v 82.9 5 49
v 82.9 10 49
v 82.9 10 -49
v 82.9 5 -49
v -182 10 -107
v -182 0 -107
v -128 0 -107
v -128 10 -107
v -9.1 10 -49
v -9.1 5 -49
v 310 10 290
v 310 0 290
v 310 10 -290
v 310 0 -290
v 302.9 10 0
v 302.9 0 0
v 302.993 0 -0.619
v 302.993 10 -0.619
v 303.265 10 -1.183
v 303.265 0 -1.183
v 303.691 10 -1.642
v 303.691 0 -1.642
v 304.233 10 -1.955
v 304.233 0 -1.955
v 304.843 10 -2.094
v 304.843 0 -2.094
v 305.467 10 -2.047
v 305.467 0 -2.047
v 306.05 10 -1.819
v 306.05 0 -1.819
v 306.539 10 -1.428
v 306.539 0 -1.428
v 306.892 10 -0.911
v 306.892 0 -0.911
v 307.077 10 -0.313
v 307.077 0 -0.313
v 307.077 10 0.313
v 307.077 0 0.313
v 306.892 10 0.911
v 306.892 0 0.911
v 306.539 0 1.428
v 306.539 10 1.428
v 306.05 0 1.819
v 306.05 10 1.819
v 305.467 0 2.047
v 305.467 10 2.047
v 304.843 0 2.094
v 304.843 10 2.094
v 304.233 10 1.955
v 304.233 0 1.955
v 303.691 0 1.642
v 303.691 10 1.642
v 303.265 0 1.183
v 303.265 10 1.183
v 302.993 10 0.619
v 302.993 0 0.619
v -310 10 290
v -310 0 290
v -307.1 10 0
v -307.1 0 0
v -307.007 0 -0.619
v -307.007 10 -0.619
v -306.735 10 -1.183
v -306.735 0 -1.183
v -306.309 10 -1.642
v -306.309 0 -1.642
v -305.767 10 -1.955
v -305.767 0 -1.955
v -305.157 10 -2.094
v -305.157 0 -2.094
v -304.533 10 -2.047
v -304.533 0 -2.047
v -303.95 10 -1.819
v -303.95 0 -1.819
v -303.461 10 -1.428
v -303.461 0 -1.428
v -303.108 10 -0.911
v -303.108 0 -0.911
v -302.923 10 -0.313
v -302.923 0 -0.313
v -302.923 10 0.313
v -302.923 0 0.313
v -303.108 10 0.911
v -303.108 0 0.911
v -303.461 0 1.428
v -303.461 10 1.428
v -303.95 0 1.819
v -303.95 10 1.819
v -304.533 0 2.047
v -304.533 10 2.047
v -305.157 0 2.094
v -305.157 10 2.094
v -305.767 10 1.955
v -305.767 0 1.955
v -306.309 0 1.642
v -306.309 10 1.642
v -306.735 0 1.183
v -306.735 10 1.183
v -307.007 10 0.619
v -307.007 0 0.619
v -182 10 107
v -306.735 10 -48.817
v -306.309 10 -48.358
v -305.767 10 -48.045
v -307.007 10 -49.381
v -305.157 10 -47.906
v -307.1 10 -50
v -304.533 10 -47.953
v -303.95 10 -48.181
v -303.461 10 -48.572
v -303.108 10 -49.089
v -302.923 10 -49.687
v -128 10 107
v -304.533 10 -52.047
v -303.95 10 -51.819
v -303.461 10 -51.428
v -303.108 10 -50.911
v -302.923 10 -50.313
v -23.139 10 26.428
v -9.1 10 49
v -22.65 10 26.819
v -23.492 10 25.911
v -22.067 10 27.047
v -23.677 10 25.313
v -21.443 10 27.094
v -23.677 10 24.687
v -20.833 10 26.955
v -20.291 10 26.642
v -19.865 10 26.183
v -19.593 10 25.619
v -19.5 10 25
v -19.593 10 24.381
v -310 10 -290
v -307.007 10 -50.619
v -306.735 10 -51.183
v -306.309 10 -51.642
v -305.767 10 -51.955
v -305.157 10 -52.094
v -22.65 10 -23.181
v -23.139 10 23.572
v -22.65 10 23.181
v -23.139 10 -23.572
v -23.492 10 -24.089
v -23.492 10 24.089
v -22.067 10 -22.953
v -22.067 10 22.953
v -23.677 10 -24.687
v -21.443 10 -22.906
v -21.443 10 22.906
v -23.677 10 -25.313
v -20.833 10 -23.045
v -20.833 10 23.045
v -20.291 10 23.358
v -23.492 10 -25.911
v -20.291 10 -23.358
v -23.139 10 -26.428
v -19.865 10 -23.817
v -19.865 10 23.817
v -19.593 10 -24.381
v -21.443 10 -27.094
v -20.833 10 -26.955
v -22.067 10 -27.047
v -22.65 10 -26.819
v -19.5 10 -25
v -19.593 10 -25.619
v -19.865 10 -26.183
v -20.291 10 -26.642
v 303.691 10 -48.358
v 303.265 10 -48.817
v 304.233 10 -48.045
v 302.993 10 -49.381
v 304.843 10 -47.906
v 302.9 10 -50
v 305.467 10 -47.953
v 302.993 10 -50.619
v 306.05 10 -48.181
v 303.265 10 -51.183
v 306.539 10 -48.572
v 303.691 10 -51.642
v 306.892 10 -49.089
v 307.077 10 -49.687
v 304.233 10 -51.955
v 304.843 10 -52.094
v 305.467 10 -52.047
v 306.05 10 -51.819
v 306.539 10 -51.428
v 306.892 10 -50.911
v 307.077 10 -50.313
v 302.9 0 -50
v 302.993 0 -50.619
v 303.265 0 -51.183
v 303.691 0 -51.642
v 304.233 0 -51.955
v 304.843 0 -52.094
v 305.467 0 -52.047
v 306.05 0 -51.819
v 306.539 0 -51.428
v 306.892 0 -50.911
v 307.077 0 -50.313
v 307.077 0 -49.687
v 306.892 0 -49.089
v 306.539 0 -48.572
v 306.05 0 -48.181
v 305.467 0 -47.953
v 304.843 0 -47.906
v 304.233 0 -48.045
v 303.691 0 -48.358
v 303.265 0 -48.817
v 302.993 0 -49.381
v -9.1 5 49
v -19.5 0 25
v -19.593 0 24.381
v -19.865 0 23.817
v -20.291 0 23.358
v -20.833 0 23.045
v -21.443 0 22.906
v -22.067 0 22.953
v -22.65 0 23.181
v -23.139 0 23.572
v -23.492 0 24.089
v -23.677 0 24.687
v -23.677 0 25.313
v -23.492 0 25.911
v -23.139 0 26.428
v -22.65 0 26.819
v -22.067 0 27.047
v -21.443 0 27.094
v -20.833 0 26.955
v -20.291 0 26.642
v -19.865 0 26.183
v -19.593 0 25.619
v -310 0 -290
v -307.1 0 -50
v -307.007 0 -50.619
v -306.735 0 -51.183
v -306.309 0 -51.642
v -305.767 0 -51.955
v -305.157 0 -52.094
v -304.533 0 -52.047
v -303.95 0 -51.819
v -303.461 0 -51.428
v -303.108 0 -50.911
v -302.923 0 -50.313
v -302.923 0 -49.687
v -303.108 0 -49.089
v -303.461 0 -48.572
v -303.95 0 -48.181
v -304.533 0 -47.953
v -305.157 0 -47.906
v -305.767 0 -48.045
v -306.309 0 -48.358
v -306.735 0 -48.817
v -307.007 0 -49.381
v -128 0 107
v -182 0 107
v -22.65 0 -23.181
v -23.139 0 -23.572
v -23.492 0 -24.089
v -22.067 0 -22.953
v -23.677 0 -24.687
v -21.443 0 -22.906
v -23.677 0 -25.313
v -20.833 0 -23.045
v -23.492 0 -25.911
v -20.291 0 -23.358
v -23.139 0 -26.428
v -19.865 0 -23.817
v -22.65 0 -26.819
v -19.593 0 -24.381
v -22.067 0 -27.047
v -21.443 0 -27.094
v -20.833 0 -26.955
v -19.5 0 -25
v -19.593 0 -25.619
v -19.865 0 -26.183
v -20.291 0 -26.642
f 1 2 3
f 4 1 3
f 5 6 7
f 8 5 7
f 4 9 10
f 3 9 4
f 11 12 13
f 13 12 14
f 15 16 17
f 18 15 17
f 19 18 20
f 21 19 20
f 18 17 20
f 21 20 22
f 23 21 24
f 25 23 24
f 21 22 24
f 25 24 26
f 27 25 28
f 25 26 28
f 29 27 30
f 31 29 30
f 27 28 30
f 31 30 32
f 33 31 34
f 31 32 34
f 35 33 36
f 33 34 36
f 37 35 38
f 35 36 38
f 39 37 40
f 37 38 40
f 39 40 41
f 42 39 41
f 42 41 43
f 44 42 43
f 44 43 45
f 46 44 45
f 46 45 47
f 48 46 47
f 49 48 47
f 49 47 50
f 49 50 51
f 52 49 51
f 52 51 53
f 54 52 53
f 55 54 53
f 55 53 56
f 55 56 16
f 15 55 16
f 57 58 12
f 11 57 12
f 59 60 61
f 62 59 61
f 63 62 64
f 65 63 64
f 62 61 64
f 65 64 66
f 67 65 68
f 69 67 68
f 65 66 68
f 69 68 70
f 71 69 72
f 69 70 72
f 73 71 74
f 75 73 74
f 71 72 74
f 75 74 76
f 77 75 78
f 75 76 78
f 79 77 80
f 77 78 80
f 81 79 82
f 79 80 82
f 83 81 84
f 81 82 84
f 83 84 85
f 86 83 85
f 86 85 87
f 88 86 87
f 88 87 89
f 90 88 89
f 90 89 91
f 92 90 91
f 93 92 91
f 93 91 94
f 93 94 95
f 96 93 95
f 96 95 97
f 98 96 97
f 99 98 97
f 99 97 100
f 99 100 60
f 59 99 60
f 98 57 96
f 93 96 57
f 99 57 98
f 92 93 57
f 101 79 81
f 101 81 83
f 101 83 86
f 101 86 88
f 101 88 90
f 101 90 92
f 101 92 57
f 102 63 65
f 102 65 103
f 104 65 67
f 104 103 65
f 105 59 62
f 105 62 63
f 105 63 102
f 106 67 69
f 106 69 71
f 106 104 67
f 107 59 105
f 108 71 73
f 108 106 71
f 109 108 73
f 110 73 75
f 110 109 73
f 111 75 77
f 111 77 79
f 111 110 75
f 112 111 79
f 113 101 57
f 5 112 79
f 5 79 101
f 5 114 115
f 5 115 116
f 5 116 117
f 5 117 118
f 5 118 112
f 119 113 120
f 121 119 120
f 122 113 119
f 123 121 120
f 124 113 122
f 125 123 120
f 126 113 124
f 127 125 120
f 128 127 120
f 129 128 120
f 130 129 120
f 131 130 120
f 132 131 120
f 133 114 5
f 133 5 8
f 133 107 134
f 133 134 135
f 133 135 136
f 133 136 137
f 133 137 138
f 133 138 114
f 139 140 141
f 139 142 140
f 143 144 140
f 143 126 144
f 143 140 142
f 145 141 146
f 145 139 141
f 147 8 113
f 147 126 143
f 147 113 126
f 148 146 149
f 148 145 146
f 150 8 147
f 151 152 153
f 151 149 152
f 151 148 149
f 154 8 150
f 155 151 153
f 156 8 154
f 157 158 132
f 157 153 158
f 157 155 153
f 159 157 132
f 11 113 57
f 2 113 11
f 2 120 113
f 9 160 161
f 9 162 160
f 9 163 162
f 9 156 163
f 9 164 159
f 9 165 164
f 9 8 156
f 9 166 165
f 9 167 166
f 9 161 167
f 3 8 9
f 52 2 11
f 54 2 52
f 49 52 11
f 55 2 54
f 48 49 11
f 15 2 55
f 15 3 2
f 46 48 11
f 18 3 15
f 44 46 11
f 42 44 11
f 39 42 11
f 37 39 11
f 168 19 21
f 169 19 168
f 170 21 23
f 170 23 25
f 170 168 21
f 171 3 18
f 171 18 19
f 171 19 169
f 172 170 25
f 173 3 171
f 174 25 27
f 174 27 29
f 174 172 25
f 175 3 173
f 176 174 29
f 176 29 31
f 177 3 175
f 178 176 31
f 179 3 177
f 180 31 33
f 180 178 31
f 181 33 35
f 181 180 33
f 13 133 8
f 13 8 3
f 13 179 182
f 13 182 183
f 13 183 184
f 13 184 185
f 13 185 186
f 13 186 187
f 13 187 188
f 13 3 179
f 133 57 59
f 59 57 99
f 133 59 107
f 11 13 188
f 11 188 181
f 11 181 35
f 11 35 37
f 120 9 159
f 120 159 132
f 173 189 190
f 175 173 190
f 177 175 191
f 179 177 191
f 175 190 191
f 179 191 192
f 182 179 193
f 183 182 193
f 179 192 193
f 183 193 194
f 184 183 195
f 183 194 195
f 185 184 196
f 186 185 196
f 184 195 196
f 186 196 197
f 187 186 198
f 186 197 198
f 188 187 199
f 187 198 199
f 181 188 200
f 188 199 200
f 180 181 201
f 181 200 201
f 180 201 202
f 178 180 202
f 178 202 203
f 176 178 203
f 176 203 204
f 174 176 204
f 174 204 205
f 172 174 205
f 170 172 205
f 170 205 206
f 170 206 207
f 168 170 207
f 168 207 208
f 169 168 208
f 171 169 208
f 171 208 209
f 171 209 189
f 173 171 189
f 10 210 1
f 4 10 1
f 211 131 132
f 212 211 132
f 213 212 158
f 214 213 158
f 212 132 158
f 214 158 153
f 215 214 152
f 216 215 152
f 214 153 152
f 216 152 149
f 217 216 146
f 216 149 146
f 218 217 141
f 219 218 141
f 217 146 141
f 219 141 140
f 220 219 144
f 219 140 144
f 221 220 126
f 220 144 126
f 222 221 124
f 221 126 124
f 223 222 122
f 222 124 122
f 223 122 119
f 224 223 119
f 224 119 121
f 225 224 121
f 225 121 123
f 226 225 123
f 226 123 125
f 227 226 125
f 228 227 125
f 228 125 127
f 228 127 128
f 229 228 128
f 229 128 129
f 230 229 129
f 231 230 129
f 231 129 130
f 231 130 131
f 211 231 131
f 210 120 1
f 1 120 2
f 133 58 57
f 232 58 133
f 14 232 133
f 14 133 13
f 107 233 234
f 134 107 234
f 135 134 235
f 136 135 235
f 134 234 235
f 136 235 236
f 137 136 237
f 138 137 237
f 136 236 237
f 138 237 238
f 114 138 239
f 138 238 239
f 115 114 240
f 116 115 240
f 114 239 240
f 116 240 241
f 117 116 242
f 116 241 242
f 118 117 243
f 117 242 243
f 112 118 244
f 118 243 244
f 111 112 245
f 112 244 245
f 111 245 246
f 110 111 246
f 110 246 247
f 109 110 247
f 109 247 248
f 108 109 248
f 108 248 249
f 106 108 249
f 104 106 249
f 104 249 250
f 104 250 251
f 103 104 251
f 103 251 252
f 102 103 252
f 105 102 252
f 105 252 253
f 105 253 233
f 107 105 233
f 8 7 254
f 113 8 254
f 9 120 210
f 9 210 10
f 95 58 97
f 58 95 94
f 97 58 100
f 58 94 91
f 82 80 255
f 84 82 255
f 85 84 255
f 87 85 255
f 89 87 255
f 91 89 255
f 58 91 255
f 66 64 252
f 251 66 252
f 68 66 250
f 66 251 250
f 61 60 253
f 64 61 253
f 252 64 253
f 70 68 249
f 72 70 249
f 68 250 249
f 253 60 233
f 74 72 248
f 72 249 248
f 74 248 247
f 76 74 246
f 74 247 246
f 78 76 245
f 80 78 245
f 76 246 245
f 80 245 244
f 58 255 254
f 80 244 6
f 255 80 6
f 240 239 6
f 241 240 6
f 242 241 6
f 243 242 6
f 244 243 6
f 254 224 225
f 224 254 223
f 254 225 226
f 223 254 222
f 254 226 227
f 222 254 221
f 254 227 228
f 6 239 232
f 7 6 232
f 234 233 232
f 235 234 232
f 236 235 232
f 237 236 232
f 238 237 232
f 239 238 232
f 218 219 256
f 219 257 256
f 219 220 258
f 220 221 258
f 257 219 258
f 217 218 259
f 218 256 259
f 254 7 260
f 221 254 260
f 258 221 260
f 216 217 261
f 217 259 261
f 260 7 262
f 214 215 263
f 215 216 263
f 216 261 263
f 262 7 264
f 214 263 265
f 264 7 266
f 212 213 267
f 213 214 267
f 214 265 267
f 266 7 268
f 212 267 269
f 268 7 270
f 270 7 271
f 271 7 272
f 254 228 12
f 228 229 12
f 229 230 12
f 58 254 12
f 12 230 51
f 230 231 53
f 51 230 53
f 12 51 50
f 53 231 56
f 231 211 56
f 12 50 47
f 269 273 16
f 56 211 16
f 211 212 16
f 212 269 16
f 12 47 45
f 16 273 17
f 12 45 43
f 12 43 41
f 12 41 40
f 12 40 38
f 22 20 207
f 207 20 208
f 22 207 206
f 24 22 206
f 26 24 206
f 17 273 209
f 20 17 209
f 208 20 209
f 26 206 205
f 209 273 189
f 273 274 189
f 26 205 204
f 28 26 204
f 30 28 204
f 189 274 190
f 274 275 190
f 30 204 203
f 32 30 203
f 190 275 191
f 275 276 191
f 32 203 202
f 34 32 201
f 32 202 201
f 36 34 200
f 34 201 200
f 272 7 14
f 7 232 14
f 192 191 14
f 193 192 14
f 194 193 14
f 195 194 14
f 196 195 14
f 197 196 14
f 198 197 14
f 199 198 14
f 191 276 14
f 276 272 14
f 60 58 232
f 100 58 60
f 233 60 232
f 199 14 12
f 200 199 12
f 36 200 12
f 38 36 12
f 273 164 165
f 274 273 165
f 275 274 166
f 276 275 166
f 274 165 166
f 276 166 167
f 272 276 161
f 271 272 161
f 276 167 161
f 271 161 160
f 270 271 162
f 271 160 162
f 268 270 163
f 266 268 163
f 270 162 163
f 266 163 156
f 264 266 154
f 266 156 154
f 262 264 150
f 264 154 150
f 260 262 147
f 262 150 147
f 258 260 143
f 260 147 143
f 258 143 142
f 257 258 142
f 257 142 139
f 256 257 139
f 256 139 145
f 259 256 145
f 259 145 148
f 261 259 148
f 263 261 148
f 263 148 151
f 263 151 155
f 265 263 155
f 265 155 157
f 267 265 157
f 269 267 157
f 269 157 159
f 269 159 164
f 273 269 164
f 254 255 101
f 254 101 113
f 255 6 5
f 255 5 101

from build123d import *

# Parameters (mm, degrees)
SKETCH_1_W             = 620
SKETCH_1_H             = 580
EXTRUDE_1_DEPTH        = 10
HOLE_WIZARD_M5_1_D     = 4.2
HOLE_WIZARD_M5_1_DEPTH = 12.2
HOLE_WIZARD_M5_1_TIP   = 1.2618073
SKETCH_5_W             = 54
SKETCH_5_H             = 214
CUT_EXTRUDE_1_DEPTH    = 425.617474911
HOLE_WIZARD_M5_2_D     = 4.2
SKETCH_10_W            = 92
SKETCH_10_H            = 98
CUT_EXTRUDE_2_DEPTH    = 5


with BuildPart() as part:
    # 草图1 → 凸台-拉伸1 (new body)
    with BuildSketch(Plane(origin=(0, 0, 0), x_dir=(1, 0, 0), z_dir=(0, 1, 0))):
        Rectangle(SKETCH_1_W, SKETCH_1_H)
    extrude(amount=EXTRUDE_1_DEPTH)

    # M5 螺纹孔1
    with Locations(Plane(origin=(0, 10, 0), x_dir=(1, 0, 0), z_dir=(0, 1, 0))):
        with Locations((-305, 50), (-305, 0), (305, 0), (305, 50)):
            Hole(HOLE_WIZARD_M5_1_D / 2, depth=HOLE_WIZARD_M5_1_DEPTH)
            with Locations((0, 0, -(HOLE_WIZARD_M5_1_DEPTH + HOLE_WIZARD_M5_1_TIP / 2))):  # 118° drill point
                Cone(0, HOLE_WIZARD_M5_1_D / 2, HOLE_WIZARD_M5_1_TIP, mode=Mode.SUBTRACT)

    # 草图5 → 切除-拉伸1 (cut, through all)
    with BuildSketch(Plane.XZ):
        with Locations((-155, 0)):
            Rectangle(SKETCH_5_W, SKETCH_5_H)
    extrude(amount=-CUT_EXTRUDE_1_DEPTH, mode=Mode.SUBTRACT)

    # M5 螺纹孔2 (through all)
    with Locations(Plane(origin=(0, 0, 0), x_dir=(-1, 0, 0), z_dir=(0, -1, 0))):
        with Locations((21.6, -25), (21.6, 25)):
            Hole(HOLE_WIZARD_M5_2_D / 2)

    # 草图10 → 切除-拉伸2 (cut)
    with BuildSketch(Plane(origin=(0, 10, 0), x_dir=(1, 0, 0), z_dir=(0, 1, 0))):
        with Locations((36.9, 0)):
            Rectangle(SKETCH_10_W, SKETCH_10_H)
    extrude(amount=-CUT_EXTRUDE_2_DEPTH, mode=Mode.SUBTRACT)


solid = part.part
